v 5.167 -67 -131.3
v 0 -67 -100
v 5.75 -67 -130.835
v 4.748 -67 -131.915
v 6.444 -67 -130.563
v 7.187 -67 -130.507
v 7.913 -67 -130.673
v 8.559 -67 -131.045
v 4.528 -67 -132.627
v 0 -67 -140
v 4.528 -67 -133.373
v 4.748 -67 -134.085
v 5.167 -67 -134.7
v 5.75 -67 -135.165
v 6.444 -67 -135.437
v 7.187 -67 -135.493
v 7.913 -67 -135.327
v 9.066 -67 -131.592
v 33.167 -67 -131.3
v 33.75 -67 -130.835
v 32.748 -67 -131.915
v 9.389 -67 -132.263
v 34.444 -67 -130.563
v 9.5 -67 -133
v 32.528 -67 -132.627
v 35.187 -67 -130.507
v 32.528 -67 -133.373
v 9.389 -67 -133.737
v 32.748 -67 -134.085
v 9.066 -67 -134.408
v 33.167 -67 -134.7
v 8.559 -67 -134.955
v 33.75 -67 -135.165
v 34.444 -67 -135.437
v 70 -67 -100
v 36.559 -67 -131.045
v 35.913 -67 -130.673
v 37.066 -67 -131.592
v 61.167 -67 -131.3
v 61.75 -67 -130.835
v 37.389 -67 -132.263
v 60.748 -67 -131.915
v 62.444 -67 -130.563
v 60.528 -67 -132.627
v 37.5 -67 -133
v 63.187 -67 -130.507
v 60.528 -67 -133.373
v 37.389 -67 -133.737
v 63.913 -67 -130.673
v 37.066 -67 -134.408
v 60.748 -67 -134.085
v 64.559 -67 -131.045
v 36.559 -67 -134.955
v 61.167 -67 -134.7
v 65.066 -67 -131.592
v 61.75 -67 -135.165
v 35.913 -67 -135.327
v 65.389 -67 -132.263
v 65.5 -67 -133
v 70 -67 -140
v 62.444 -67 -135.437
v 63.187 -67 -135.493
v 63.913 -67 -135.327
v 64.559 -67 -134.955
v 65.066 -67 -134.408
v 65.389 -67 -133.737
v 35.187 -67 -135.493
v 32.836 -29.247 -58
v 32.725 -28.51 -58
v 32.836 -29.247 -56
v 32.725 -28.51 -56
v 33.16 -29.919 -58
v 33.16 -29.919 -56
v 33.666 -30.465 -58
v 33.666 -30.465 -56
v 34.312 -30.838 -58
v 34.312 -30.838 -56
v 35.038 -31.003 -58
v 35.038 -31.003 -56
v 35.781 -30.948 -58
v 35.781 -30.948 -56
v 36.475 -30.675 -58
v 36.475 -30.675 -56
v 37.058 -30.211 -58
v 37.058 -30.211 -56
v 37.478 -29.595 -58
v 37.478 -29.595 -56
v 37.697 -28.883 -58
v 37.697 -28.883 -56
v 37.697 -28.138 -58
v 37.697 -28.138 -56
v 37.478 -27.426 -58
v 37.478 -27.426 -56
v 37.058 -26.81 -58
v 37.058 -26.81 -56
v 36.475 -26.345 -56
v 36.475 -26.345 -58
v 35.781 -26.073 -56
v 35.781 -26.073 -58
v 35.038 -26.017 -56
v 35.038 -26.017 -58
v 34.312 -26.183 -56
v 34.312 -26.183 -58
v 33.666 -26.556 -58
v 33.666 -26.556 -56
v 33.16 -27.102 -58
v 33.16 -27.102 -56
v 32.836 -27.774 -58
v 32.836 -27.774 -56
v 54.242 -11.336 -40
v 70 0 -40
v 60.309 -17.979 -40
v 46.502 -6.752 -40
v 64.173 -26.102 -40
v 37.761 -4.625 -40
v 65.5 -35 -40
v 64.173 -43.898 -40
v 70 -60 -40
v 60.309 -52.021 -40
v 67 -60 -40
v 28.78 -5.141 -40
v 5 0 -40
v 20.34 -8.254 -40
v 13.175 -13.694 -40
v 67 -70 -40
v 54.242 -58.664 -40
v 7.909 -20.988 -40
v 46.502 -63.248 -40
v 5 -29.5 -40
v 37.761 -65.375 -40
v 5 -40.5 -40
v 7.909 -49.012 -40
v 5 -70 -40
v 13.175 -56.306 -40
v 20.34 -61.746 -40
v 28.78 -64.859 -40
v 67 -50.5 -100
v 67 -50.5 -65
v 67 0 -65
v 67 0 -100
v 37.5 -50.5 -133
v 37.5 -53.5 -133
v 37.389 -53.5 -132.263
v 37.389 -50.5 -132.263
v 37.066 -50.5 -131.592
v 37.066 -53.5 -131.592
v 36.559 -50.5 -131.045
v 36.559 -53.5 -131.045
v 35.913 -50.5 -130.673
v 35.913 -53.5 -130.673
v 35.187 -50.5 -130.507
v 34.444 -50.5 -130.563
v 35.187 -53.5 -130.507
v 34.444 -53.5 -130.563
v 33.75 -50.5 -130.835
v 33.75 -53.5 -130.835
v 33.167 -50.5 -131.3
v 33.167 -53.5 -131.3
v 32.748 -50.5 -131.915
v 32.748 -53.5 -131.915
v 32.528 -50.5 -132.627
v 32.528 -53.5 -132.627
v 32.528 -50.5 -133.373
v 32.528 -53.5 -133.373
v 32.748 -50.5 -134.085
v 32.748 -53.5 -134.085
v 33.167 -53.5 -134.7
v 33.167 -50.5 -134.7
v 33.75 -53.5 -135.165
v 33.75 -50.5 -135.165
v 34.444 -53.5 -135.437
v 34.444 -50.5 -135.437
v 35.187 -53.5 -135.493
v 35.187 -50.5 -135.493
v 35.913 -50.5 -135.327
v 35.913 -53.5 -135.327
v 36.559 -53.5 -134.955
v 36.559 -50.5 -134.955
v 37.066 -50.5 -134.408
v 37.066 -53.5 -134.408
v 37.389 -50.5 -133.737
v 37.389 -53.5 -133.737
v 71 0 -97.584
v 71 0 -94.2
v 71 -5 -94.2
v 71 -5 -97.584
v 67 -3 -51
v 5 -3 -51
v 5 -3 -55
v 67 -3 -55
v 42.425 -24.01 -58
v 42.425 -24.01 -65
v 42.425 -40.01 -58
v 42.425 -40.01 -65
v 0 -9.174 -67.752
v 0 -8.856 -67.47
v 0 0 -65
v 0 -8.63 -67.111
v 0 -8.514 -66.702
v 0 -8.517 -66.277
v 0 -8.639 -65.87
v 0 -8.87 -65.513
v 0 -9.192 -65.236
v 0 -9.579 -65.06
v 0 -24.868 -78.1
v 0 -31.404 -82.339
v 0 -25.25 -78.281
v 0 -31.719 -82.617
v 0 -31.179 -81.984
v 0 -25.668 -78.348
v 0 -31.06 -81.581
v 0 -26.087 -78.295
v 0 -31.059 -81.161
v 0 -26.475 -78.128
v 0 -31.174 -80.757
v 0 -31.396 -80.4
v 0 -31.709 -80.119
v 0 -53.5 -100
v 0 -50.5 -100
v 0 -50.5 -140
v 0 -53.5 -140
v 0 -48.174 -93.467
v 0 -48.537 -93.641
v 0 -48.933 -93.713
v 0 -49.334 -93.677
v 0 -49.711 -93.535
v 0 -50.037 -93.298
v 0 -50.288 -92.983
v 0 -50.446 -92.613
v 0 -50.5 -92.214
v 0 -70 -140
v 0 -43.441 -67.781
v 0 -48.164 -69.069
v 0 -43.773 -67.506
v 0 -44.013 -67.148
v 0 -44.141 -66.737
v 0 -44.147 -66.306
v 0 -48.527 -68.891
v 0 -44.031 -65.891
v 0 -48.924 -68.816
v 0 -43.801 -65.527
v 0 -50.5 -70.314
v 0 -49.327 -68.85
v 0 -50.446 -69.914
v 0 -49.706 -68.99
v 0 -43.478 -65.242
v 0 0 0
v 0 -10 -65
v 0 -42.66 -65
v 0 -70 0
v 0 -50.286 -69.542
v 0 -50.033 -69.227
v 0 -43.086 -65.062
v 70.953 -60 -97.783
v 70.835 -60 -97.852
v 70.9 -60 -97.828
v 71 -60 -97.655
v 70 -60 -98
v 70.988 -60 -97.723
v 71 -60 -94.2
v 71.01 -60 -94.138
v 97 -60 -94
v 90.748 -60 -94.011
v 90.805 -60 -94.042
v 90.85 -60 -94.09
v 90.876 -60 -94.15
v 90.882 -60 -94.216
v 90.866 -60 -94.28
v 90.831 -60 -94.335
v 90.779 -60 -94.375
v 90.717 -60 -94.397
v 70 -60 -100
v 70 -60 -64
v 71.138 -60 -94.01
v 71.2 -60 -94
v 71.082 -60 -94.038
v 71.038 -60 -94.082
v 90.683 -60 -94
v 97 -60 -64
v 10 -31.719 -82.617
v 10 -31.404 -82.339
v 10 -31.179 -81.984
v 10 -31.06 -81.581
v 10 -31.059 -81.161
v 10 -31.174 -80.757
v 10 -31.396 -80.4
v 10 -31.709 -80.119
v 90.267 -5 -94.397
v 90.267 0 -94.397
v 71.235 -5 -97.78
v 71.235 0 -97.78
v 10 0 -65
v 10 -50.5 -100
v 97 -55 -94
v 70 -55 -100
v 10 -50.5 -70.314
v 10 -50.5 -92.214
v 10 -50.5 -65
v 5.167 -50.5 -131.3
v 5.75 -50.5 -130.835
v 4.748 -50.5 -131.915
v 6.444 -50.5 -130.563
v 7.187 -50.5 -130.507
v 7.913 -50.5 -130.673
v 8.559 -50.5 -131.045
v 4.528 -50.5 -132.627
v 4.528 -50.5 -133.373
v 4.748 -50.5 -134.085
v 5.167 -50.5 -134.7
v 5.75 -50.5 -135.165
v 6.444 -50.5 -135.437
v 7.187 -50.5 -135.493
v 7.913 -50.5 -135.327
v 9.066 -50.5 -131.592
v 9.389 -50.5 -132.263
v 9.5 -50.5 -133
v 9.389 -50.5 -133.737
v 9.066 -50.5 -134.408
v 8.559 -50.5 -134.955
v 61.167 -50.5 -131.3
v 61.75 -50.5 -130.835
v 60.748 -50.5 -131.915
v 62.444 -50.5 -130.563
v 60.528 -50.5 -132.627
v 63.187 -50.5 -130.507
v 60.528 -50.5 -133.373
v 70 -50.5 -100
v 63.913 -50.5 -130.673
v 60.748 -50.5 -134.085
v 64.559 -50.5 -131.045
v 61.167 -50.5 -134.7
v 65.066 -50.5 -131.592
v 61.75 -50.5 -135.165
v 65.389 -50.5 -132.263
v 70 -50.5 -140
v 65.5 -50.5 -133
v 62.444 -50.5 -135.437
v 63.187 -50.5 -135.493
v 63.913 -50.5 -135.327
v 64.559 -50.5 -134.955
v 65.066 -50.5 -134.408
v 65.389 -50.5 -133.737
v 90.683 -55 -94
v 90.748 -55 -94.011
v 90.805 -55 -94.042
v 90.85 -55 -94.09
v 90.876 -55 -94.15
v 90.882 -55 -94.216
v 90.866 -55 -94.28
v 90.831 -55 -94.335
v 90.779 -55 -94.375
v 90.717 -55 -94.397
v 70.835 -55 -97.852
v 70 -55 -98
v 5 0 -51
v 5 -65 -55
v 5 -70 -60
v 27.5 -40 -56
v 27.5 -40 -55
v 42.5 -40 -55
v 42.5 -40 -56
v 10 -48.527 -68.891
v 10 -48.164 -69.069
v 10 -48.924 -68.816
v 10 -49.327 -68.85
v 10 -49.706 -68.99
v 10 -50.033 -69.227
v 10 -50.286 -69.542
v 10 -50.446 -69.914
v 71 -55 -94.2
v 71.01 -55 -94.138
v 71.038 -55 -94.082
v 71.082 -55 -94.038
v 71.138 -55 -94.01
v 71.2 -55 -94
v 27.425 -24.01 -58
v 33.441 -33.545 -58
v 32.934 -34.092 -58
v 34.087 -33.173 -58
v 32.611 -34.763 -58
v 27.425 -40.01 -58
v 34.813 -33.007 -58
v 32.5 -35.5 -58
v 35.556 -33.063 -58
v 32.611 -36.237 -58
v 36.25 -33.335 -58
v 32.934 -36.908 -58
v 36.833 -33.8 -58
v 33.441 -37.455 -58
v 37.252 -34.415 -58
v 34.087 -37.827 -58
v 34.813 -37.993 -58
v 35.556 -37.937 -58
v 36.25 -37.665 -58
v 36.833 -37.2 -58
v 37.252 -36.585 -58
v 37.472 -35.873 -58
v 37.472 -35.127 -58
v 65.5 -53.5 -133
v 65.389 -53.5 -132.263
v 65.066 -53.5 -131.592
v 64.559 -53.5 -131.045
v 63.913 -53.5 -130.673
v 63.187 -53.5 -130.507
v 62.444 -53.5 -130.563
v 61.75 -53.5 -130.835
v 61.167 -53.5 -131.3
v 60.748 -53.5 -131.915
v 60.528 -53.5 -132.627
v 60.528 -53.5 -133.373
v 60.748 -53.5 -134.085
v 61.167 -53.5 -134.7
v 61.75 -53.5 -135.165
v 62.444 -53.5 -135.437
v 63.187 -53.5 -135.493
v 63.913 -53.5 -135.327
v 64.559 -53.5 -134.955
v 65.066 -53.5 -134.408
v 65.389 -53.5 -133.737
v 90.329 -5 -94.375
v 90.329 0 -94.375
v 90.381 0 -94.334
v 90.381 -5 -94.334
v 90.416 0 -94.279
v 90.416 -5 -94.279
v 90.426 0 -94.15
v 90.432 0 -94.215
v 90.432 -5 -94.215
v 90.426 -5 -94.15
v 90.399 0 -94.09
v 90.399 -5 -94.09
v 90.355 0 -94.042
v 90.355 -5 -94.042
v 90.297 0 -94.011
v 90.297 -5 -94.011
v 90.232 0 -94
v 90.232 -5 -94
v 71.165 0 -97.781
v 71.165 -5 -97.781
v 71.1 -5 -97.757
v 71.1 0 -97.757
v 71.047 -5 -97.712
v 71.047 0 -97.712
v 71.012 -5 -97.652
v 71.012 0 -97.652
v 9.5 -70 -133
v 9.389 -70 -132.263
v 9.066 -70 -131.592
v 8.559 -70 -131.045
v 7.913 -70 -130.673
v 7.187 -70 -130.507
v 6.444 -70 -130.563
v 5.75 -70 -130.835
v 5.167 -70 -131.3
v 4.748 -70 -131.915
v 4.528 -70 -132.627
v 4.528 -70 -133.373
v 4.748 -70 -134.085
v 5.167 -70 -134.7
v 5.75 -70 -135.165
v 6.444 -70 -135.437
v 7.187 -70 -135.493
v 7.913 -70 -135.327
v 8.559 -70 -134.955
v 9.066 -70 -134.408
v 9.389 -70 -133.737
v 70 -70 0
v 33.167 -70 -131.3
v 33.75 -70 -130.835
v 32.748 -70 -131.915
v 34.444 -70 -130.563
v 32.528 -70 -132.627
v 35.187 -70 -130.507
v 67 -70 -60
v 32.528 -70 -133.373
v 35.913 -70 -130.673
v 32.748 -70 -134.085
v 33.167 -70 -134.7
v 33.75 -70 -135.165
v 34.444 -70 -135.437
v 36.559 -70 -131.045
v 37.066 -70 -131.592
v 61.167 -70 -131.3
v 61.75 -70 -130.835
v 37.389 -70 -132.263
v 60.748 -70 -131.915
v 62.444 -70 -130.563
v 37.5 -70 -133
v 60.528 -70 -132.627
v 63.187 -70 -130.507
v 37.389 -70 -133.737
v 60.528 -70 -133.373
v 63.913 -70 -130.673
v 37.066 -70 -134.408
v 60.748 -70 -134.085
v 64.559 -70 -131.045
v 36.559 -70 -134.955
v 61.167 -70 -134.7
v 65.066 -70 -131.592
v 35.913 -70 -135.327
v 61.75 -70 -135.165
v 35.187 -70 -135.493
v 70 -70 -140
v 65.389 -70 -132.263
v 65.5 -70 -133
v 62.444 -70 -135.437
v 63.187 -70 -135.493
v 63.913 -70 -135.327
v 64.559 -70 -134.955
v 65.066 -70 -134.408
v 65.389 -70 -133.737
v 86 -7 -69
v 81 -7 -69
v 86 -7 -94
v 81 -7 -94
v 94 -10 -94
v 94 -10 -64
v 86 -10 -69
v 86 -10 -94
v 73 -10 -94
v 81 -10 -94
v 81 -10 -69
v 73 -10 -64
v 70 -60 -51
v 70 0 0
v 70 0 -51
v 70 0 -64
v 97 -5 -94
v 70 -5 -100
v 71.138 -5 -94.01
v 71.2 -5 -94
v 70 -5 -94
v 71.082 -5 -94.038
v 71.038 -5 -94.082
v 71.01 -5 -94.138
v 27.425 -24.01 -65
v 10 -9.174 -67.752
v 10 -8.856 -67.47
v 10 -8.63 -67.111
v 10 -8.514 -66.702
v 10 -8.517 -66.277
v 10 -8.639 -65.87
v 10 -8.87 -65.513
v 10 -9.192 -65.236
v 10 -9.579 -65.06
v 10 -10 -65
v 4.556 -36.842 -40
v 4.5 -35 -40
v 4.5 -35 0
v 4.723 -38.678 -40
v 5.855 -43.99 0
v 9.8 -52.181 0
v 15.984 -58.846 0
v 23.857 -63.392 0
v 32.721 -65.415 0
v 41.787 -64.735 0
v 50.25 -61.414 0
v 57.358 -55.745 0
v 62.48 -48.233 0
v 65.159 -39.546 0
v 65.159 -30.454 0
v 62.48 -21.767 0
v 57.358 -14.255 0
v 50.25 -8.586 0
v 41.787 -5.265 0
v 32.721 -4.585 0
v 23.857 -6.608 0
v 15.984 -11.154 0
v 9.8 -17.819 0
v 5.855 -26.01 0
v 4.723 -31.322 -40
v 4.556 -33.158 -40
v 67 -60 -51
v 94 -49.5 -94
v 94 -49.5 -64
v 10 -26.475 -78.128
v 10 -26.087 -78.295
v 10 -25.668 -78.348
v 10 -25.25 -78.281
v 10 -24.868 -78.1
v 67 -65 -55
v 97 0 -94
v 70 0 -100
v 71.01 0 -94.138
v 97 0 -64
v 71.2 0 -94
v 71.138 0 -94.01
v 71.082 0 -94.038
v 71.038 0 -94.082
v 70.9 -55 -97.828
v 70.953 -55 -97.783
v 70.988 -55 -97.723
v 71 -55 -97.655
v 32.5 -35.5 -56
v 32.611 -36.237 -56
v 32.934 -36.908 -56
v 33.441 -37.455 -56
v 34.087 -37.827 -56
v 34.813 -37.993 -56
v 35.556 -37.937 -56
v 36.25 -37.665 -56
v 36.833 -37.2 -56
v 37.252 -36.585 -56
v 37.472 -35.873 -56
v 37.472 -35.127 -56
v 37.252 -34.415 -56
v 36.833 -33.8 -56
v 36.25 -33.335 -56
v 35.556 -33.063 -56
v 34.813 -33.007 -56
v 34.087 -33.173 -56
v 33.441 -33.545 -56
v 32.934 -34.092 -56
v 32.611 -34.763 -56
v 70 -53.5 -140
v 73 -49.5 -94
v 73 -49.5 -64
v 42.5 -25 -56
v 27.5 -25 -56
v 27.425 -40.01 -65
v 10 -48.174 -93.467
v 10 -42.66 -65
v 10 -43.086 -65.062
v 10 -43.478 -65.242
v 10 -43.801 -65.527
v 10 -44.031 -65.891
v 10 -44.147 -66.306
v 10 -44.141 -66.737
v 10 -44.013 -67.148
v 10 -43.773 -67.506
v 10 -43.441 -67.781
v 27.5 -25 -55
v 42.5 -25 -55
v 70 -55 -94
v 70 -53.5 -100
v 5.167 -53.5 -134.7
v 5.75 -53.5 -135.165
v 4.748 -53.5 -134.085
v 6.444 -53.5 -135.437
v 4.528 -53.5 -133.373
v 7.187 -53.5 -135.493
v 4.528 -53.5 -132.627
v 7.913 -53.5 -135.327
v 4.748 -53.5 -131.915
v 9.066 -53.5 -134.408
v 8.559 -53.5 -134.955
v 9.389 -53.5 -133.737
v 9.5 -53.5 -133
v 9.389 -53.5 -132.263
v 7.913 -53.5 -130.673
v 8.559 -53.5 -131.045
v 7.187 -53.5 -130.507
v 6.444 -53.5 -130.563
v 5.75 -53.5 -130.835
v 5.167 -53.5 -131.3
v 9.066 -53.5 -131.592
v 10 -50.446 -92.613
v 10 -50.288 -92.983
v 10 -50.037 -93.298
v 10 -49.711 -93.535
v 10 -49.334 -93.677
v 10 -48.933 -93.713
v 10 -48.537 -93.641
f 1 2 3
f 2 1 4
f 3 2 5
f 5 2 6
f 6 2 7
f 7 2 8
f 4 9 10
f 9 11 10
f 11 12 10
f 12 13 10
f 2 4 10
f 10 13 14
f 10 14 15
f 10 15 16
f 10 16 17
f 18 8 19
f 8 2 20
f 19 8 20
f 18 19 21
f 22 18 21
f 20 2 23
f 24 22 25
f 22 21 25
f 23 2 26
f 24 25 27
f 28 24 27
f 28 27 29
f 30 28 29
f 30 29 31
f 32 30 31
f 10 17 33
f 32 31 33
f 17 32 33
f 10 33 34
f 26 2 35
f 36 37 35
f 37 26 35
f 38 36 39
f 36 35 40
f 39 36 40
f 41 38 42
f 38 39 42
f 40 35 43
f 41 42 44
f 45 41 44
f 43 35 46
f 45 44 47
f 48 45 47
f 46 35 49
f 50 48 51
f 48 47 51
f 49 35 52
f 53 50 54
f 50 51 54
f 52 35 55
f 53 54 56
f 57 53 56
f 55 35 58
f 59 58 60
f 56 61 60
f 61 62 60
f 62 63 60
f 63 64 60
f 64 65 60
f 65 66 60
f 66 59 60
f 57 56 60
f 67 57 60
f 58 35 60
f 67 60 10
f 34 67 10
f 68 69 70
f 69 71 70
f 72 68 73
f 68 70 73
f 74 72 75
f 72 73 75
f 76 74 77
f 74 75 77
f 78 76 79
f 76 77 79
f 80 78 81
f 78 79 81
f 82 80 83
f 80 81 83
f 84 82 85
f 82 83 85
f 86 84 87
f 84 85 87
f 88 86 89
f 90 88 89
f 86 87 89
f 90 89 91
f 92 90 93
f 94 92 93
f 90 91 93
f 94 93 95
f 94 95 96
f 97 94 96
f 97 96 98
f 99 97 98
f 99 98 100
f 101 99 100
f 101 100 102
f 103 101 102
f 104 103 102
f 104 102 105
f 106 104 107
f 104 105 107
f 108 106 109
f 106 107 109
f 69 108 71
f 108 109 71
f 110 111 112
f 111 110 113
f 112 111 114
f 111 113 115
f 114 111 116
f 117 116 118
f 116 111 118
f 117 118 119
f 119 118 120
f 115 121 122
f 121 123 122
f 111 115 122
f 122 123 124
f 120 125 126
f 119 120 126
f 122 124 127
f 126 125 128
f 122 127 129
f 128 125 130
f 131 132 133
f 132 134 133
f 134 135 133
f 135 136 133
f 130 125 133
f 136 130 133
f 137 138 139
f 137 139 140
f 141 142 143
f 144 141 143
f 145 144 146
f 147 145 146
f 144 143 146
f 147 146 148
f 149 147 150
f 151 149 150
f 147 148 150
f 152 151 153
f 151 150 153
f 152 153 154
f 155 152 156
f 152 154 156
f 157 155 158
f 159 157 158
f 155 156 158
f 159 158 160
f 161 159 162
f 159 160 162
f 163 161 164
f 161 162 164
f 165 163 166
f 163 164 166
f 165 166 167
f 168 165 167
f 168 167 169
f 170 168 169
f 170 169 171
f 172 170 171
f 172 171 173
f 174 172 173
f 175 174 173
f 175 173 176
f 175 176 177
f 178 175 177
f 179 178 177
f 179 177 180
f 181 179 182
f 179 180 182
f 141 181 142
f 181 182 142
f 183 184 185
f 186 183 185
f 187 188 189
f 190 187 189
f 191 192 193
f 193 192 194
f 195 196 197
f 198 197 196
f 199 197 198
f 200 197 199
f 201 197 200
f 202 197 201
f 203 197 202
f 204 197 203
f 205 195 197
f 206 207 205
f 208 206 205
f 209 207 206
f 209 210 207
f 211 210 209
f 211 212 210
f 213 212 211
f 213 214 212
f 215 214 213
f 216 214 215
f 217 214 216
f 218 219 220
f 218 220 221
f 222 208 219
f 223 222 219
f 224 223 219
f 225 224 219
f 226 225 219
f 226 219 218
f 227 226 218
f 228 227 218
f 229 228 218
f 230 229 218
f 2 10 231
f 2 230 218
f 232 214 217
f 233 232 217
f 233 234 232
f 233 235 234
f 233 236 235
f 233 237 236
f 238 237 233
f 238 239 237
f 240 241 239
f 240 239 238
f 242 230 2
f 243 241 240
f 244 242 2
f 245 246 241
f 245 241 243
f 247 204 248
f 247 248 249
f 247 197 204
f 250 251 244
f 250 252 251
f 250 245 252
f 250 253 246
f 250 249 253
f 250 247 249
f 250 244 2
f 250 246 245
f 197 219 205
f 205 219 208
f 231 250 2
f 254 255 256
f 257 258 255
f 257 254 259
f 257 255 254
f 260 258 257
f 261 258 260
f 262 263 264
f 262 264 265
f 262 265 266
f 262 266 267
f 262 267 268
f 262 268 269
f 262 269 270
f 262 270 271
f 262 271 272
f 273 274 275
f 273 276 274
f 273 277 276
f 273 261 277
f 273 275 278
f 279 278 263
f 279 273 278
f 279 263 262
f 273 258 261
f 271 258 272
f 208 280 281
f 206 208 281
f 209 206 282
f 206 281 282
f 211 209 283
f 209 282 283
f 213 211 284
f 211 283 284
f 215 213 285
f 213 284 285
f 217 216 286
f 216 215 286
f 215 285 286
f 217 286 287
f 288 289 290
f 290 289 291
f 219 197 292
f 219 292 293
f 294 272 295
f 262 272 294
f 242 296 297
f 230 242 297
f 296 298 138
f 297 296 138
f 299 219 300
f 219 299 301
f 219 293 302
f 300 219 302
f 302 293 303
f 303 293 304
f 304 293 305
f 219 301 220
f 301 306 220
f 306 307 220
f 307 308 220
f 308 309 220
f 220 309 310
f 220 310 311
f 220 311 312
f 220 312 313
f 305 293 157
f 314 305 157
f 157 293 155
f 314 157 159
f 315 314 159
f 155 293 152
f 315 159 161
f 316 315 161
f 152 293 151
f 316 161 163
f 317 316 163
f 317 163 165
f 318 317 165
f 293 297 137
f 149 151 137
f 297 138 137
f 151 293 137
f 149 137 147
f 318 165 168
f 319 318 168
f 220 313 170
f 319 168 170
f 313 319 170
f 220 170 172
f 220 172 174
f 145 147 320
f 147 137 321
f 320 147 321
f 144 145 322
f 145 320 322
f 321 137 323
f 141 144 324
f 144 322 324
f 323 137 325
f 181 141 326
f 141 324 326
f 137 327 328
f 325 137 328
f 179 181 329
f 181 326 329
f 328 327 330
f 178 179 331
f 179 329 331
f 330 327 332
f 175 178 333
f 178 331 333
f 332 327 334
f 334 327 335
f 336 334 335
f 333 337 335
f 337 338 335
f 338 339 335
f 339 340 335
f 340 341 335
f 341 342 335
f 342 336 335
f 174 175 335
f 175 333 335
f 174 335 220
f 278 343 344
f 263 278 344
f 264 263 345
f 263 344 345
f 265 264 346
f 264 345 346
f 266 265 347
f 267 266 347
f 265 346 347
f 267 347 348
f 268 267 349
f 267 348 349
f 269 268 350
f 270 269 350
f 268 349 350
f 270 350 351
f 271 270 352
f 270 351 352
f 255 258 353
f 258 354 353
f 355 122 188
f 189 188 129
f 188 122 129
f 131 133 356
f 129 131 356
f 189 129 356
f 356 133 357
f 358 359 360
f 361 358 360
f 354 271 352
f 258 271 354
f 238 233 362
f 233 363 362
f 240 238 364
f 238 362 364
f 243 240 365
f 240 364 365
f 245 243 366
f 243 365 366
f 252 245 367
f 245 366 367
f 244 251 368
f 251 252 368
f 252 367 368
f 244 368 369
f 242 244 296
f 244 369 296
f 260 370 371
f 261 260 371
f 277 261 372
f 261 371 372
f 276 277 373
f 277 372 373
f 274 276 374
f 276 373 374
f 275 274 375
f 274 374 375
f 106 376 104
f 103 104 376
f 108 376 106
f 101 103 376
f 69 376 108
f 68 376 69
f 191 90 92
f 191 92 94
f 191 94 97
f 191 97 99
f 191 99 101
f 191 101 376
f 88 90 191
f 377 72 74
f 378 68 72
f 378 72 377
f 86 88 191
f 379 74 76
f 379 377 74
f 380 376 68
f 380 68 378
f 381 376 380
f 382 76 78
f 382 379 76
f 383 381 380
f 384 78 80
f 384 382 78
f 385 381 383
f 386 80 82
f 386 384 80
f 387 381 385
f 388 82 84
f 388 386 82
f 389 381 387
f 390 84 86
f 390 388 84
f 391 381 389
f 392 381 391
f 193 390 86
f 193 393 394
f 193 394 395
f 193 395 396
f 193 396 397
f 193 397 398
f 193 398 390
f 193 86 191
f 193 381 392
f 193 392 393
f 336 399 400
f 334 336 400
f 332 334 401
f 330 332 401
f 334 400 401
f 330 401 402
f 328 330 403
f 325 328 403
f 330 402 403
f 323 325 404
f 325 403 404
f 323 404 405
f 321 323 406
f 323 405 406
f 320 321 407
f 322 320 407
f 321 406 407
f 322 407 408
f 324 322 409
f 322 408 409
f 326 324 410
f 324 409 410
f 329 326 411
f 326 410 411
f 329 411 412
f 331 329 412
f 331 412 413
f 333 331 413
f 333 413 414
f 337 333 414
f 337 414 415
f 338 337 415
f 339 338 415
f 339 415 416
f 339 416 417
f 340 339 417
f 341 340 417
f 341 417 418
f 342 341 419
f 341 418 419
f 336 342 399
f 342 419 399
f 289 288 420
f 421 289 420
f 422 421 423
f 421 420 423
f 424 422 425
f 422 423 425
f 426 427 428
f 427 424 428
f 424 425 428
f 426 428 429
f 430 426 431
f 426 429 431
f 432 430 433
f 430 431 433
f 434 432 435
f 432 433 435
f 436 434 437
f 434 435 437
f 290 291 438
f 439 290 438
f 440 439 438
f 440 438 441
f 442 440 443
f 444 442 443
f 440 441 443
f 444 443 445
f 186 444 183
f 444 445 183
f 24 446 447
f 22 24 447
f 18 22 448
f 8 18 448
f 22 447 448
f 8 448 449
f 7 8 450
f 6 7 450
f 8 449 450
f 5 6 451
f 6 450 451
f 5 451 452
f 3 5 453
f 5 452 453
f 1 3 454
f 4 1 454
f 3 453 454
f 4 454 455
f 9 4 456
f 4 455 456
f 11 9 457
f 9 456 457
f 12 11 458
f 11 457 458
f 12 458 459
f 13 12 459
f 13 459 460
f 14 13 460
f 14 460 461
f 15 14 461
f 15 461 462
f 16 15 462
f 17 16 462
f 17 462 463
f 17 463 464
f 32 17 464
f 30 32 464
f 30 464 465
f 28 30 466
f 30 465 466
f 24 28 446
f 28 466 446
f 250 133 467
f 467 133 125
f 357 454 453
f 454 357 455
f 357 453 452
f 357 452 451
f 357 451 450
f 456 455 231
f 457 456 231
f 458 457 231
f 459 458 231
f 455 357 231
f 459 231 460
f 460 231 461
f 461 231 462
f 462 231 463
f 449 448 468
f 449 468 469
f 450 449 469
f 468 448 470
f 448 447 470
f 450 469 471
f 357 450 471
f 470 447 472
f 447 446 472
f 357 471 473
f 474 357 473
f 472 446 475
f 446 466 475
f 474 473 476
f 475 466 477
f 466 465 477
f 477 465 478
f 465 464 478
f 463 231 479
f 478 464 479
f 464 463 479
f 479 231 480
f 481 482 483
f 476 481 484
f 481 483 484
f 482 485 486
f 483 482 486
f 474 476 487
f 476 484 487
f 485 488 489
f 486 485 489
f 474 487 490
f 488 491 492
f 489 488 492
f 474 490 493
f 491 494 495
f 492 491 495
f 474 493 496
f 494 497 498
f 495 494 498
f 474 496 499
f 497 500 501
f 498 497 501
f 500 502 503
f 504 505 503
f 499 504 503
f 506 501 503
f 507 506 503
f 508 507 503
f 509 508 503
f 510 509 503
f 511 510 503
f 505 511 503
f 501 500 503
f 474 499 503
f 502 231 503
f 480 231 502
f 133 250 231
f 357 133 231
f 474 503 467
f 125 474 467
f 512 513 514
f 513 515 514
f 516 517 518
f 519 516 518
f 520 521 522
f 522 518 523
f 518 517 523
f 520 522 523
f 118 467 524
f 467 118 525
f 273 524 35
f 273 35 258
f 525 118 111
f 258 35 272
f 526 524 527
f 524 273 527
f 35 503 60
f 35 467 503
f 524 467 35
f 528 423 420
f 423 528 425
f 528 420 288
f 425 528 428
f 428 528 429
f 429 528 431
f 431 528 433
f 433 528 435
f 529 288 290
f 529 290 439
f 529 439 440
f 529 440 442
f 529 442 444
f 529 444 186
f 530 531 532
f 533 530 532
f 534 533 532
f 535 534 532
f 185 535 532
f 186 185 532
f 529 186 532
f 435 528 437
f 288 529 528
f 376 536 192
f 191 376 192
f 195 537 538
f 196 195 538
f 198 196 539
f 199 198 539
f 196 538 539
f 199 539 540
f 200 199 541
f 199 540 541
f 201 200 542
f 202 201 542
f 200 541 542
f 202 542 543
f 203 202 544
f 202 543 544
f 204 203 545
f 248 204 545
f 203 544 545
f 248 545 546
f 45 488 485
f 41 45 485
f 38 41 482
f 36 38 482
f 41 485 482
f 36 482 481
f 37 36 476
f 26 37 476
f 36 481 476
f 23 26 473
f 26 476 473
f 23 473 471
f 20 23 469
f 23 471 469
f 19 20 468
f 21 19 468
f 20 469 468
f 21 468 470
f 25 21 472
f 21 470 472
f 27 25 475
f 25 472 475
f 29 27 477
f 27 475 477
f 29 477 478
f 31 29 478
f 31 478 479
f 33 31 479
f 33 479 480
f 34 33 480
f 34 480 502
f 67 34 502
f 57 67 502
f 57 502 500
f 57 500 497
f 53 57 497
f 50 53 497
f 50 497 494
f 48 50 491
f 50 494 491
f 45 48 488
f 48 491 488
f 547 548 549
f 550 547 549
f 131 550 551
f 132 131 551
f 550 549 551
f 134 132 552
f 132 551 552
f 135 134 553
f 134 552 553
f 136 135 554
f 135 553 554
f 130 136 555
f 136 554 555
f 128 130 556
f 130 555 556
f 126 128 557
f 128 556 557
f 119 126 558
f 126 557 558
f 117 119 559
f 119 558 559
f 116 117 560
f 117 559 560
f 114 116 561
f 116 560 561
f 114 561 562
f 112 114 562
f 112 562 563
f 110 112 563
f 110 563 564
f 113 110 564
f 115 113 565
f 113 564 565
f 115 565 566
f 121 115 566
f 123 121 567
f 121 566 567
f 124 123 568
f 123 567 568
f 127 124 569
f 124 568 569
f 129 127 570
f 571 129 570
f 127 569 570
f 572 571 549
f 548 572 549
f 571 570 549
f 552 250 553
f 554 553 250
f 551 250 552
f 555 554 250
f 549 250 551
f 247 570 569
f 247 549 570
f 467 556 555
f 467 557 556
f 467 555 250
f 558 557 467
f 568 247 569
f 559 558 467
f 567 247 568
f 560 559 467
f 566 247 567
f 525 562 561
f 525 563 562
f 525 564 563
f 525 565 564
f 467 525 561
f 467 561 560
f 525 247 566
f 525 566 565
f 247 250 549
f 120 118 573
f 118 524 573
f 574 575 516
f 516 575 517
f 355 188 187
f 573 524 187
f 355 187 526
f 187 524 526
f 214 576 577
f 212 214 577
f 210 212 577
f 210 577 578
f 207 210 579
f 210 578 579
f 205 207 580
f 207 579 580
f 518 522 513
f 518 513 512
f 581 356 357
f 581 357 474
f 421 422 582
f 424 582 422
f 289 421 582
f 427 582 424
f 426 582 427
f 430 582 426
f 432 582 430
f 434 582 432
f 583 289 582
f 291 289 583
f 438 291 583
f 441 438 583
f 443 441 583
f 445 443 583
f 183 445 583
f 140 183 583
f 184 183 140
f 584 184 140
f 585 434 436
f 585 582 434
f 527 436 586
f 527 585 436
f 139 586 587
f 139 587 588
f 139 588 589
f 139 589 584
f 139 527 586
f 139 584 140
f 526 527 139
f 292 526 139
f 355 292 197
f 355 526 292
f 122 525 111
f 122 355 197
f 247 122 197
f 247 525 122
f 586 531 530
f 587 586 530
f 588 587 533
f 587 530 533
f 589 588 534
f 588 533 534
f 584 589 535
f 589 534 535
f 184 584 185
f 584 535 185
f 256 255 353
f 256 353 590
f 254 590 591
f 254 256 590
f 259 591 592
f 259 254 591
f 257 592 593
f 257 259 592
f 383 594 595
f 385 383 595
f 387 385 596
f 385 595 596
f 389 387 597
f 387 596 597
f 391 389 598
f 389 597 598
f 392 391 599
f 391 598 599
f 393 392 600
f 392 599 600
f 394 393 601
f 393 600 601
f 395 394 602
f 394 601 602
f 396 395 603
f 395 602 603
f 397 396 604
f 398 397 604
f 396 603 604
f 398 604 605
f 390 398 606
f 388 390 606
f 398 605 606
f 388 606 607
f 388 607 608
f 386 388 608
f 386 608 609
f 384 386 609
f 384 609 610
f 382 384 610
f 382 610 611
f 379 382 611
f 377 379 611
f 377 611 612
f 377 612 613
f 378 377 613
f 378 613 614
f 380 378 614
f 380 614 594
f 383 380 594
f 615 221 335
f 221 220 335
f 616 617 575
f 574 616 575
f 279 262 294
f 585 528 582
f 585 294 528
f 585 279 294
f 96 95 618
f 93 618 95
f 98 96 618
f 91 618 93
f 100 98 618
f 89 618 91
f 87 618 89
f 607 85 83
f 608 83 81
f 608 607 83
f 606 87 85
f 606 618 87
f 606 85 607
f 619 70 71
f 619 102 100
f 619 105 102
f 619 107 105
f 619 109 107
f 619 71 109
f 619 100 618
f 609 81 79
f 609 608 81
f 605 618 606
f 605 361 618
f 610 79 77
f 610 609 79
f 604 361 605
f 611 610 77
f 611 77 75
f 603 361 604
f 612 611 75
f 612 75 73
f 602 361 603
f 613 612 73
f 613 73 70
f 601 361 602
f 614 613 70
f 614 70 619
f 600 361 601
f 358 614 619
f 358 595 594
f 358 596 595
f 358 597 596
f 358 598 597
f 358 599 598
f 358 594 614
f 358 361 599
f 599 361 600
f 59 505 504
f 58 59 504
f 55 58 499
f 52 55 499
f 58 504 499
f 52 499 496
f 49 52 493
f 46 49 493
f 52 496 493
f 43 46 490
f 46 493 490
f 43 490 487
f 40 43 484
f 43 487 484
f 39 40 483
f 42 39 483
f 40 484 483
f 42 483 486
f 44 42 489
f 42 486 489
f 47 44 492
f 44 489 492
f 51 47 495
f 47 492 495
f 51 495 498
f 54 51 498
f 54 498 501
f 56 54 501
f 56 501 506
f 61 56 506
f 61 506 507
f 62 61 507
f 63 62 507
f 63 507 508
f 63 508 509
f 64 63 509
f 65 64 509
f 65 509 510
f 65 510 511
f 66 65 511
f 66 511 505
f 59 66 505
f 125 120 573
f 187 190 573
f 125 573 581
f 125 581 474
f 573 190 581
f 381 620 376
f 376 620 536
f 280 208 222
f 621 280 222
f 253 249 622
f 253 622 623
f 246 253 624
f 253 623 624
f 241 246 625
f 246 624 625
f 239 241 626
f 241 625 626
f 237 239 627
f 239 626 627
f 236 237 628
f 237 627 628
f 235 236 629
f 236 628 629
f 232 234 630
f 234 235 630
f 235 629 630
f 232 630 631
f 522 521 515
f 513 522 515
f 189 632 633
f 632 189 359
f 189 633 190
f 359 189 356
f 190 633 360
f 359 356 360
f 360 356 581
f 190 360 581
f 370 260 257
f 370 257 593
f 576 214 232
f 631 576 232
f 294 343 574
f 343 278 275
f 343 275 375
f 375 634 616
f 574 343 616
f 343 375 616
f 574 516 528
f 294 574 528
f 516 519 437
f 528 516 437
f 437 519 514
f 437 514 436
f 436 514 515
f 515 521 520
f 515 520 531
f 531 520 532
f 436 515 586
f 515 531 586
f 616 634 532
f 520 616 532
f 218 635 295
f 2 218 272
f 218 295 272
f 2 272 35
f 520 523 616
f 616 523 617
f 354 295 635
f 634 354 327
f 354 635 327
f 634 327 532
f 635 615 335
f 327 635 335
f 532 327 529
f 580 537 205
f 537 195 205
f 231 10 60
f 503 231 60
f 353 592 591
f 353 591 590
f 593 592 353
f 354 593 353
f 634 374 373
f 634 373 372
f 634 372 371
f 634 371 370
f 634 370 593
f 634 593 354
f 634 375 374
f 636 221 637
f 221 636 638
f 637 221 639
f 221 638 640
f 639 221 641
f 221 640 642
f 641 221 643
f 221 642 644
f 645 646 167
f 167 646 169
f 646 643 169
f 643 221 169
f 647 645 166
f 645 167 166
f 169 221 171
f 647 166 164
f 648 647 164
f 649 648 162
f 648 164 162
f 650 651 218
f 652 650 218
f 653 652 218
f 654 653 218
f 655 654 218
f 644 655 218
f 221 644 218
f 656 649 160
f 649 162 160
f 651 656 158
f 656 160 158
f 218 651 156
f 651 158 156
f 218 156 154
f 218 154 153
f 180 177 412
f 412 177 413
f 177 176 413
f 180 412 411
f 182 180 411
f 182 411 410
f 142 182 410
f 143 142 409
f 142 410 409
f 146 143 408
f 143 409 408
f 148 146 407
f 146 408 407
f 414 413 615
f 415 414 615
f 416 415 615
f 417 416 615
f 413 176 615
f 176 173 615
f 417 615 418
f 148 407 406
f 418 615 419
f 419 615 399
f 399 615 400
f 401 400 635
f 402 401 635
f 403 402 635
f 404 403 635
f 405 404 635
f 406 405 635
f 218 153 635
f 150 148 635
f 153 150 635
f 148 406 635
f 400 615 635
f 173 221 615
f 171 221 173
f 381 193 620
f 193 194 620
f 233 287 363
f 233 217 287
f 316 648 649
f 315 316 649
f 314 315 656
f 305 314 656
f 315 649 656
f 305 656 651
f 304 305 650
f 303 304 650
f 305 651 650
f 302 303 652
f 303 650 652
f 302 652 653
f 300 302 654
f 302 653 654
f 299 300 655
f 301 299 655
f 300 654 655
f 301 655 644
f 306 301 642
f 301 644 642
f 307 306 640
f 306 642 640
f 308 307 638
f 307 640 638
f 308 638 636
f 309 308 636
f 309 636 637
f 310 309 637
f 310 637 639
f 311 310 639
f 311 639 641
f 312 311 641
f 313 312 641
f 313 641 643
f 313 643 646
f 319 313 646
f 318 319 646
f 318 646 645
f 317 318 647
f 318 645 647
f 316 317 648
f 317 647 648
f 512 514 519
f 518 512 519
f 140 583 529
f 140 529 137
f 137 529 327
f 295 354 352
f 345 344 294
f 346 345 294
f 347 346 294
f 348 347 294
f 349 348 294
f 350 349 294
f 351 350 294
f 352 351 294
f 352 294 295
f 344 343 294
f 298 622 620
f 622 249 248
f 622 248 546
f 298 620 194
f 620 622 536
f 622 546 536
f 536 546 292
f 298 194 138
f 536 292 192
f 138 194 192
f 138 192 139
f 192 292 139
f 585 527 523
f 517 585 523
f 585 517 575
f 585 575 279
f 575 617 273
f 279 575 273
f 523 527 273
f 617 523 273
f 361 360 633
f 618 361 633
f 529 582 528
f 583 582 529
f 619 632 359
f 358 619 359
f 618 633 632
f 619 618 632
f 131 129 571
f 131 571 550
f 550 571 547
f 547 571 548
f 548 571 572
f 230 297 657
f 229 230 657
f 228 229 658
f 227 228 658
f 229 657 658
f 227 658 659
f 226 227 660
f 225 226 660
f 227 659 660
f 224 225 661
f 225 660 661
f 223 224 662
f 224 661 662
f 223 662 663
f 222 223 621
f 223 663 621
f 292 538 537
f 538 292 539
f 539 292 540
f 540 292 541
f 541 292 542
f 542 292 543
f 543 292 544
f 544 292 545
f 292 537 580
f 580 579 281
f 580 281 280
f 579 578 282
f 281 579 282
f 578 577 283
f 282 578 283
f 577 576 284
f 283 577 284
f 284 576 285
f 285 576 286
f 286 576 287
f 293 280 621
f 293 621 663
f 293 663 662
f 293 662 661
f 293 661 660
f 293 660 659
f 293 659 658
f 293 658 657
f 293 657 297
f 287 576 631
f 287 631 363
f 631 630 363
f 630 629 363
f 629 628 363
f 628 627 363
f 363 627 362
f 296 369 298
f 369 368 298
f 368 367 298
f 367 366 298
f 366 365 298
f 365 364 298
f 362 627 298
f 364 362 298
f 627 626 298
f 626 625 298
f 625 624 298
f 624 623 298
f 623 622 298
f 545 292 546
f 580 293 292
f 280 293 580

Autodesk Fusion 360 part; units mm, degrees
sketch "Sketch1" plane through (0, 0, 0) normal (0, 0, 1) x (1, 0, 0)
  line L0 (0, 0) -> (70, 0)
  line L1 (70, 0) -> (70, -70)
  line L2 (70, -70) -> (0, -70)
  line L3 (0, -70) -> (0, 0)
  dimension "d3" = 70
  dimension "d4" = 70
extrude "Extrude1" add sketch "Sketch1" against normal blind 140
sketch "Sketch2" plane through (0, 0, 0) normal (0, 0, 1) x (-1, 0, 0)
  line L0 (0, 70) -> (-70, 70)
  line L1 (-70, 70) -> (-70, 0)
  line L2 (-70, 0) -> (0, 0)
  line L3 (0, 0) -> (0, 70)
  line L4 (0, 0) -> (-35, 0) construction
  line L5 (-35, 0) -> (-35, 35) construction
  circle A0 centre (-35, 35) radius 30.5
  dimension "d7" = 35
  dimension "d8" = 35
  dimension "d9" = 61
extrude "Extrude2" cut sketch "Sketch2" against normal blind 40 contours A0
sketch "Sketch3" plane through (0, -70, 0) normal (0, -1, 0) x (1, 0, 0)
  line L0 (70, 0) -> (0, 0)
  line L1 (0, 0) -> (0, -140)
  line L2 (0, -140) -> (70, -140)
  line L3 (70, -140) -> (70, 0)
  line L4 (0, 0) -> (0, -40) construction
  line L5 (0, -40) -> (5, -40) construction
  line L6 (5, -40) -> (5, -55) construction
  line L7 (5, -55) -> (70, -55)
  line L8 (70, -55) -> (70, -40)
  line L9 (70, -40) -> (5, -40)
  line L10 (5, -40) -> (5, -55)
  dimension "d12" = 40
  dimension "d13" = 5
  dimension "d14" = 15
extrude "Extrude3" cut sketch "Sketch3" against normal blind 120 contours L3 L7 L8 L9 L10
sketch "Sketch4" plane through (70, 0, 0) normal (1, 0, 0) x (0, 1, 0)
  line L0 (0, -55) -> (-70, -55)
  line L1 (-70, -55) -> (-70, -140)
  line L2 (-70, -140) -> (0, -140)
  line L3 (0, -140) -> (0, -55)
  line L4 (-70, -140) -> (-67, -140) construction
  line L5 (-67, -140) -> (-53.5, -140)
  line L6 (-53.5, -140) -> (-53.5, -100)
  line L7 (-53.5, -100) -> (-67, -100)
  line L8 (-67, -100) -> (-67, -140)
  line L9 (-53.5, -140) -> (-50.5, -140) construction
  line L10 (-50.5, -140) -> (0, -140)
  line L11 (0, -140) -> (0, -100)
  line L12 (0, -100) -> (-50.5, -100)
  line L13 (-50.5, -100) -> (-50.5, -140)
  dimension "d19" = 3
  dimension "d20" = 13.5
  dimension "d21" = 40
  dimension "d24" = 3
extrude "Extrude4" cut sketch "Sketch4" against normal blind 170 contours L2 L3 L10 L11 L12 L13 | L2 L5 L6 L7 L8
sketch "Sketch5" plane through (0, 0, 0) normal (0, 1, 0) x (-1, 0, 0)
  line L0 (-70, -100) -> (0, -100)
  line L1 (0, -100) -> (0, 0)
  line L2 (0, 0) -> (-70, 0)
  line L3 (-70, -40) -> (-5, -40)
  line L4 (-5, -40) -> (-5, -55)
  line L5 (-5, -55) -> (-70, -55)
  line L6 (-70, 0) -> (-70, -40)
  line L7 (-70, -100) -> (-67, -100)
  line L8 (-67, -100) -> (0, -100)
  line L9 (0, -100) -> (0, -65)
  line L10 (0, -65) -> (-67, -65)
  line L11 (-67, -65) -> (-67, -100)
  line L12 (-70, -55) -> (-70, -100)
  dimension "d25" = 3
  dimension "d26" = 67
  dimension "d27" = 35
extrude "Extrude5" cut sketch "Sketch5" against normal blind 50.5 contours L0 L1 L8 L9 L10 L11
sketch "Sketch6" plane through (0, 0, 0) normal (-1, 0, 0) x (0, -1, 0)
  line L0 (50.5, -65) -> (50.5, -140)
  line L1 (50.5, -140) -> (53.5, -140)
  line L2 (53.5, -140) -> (53.5, -100)
  line L3 (53.5, -100) -> (67, -100)
  line L4 (67, -100) -> (67, -140)
  line L5 (67, -140) -> (70, -140)
  line L6 (70, -140) -> (70, 0)
  line L7 (70, 0) -> (0, 0)
  line L8 (0, 0) -> (0, -65)
  line L9 (0, -65) -> (50.5, -65)
  line L10 (0, -65) -> (50.5, -100)
  line L11 (50.5, -100) -> (50.5, -95)
  line L12 (0, -65) -> (5, -65)
  line L13 (5, -65) -> (50.5, -95)
extrude "Extrude6" add sketch "Sketch6" against normal blind 10 contours L0 L9 L10 L11 L12 L13
sketch "Sketch8" plane through (0, 0, 0) normal (-1, 0, 0) x (0, -1, 0)
  line L0 (50.5, -100) -> (50.5, -140)
  line L1 (50.5, -140) -> (53.5, -140)
  line L2 (53.5, -140) -> (53.5, -100)
  line L3 (53.5, -100) -> (67, -100)
  line L4 (67, -100) -> (67, -140)
  line L5 (67, -140) -> (70, -140)
  line L6 (70, -140) -> (70, 0)
  line L7 (70, 0) -> (0, 0)
  line L8 (0, 0) -> (0, -65)
  line L9 (0, -65) -> (50.5, -100)
  line L10 (50.5, -95) -> (5, -65)
  line L11 (5, -65) -> (50.5, -65)
  line L12 (50.5, -65) -> (50.5, -95)
  line L13 (27.75, -80) -> (29.8372, -81.3761)
  line L14 (50.5, -65) -> (50.5, -67.5)
  line L15 (29.8372, -81.3761) -> (50.5, -67.5)
  line L16 (27.75, -80) -> (25.6628, -78.6239)
  line L17 (50.5, -65) -> (48, -65)
  line L18 (25.6628, -78.6239) -> (48, -65)
  dimension "d35" = 2.5
  dimension "d36" = 2.5
  dimension "d37" = 2.5
  dimension "d38" = 2.5
extrude "Extrude7" add sketch "Sketch8" against normal blind 10 contours L10 L11 L12 L13 L14 L15 L16 L17 L18
fillet "Fillet2" radius 1.5 6 edges at (5, -25.6628, -78.6239) (5, -50.5, -95) (5, -50.5, -67.5) (5, -29.8372, -81.3761) (5, -5, -65) (5, -48, -65)
sketch "Sketch10" plane through (0, -70, 0) normal (0, -1, 0) x (1, 0, 0)
  line L0 (70, 0) -> (0, 0)
  line L1 (0, 0) -> (0, -140)
  line L2 (0, -140) -> (70, -140)
  line L3 (70, -40) -> (70, 0)
  line L4 (70, -55) -> (5, -55)
  line L5 (5, -55) -> (5, -40)
  line L6 (5, -40) -> (70, -40)
  line L7 (0, -140) -> (0, -133) construction
  line L8 (0, -133) -> (7, -133) construction
  line L9 (70, -40) -> (70, -33) construction
  line L10 (70, -33) -> (63, -33) construction
  circle A0 centre (7, -133) radius 2.5
  circle A1 centre (35, -133) radius 2.5
  circle A2 centre (63, -133) radius 2.5
  line L11 (70, -140) -> (70, -55)
  dimension "d43" = 7
  dimension "d44" = 7
  dimension "d45" = 7
  dimension "d46" = 7
  dimension "d47" = 5
  dimension "d50" = 56
  dimension "d51" = 0
extrude "Extrude8" cut sketch "Sketch10" against normal blind 30 contours A0 | A1 | A2
chamfer "Chamfer1" distance 5 angle 45 1 edges at (37.5, -70, -55)
sketch "Sketch11" plane through (0, 0, -55) normal (0, 0, 1) x (-1, 0, 0)
  line L0 (-5, 65) -> (-70, 65)
  line L1 (-70, 65) -> (-70, 0)
  line L2 (-70, 0) -> (-5, 0)
  line L3 (-5, 0) -> (-5, 65)
  line L4 (-70, 70) -> (-67, 70)
  line L5 (-67, 70) -> (-67, 0)
  line L6 (-67, 0) -> (-70, 0)
  line L7 (-70, 0) -> (-70, 70)
  dimension "d55" = 3
  dimension "d56" = 70
extrude "Extrude9" add sketch "Sketch11" along normal blind 4 contours L0 L1 L2 L5 L6 L7 | L0 L4 L5 L7
extrude "Extrude10" add 1 faces at (69, -68.3333, -55) along direction (0, 0, -1) up to surface end surface through (5, -67.5, -57.5) normal (0, -0.707107, 0.707107) offset 0
sketch "Sketch12" plane through (67, 0, 0) normal (-1, 0, 0) x (0, -1, 0)
  line L0 (70, -60) -> (70, -51)
  line L1 (70, -51) -> (0, -51)
  line L2 (0, -51) -> (0, -55)
  line L3 (0, -55) -> (65, -55)
  line L4 (65, -55) -> (70, -60)
  line L5 (0, -51) -> (3, -51)
  line L6 (3, -51) -> (3, -55)
  line L7 (3, -55) -> (0, -55)
  line L8 (0, -55) -> (0, -51)
  dimension "d61" = 3
  dimension "d62" = 4
extrude "Extrude11" add sketch "Sketch12" along normal up to surface (62 mm away) contours L1 L2 L3 L5 L6 L7 L8
sketch "Sketch13" plane through (0, 0, -51) normal (0, 0, 1) x (-1, 0, 0)
  line L0 (-70, 0) -> (-5, 0)
  line L1 (-5, 0) -> (-5, 3)
  line L2 (-5, 3) -> (-67, 3)
  line L3 (-67, 3) -> (-67, 70)
  line L4 (-67, 70) -> (-70, 70)
  line L5 (-70, 70) -> (-70, 0)
  line L6 (-67, 70) -> (-70, 70)
  line L7 (-70, 70) -> (-70, 60)
  line L8 (-70, 60) -> (-67, 60)
  line L9 (-67, 60) -> (-67, 70)
  dimension "d65" = 3
  dimension "d66" = 10
extrude "Extrude12" add sketch "Sketch13" along normal up to surface (11 mm away) contours L3 L4 L5 L6 L7 L8 L9
sketch "Sketch14" plane through (70, 0, 0) normal (1, 0, 0) x (0, 1, 0)
  line L0 (-70, 0) -> (-70, -140)
  line L1 (-70, -140) -> (-67, -140)
  line L2 (-67, -140) -> (-67, -100)
  line L3 (-67, -100) -> (-53.5, -100)
  line L4 (-53.5, -100) -> (-53.5, -140)
  line L5 (-53.5, -140) -> (-50.5, -140)
  line L6 (-50.5, -140) -> (-50.5, -100)
  line L7 (-50.5, -100) -> (0, -100)
  line L8 (0, -100) -> (0, -51)
  line L9 (0, -51) -> (-60, -51)
  line L10 (-60, -51) -> (-60, -40)
  line L11 (-60, -40) -> (0, -40)
  line L12 (0, -40) -> (0, 0)
  line L13 (0, 0) -> (-70, 0)
  line L14 (0, -51) -> (0, -64) construction
  line L15 (0, -64) -> (-60, -64)
  line L16 (-60, -64) -> (-60, -94)
  line L17 (-60, -94) -> (0, -94)
  line L18 (0, -94) -> (0, -64)
  dimension "d69" = 13
  dimension "d70" = 60
  dimension "d71" = 30
extrude "Extrude13" add sketch "Sketch14" along normal blind 27 contours L8 L15 L16 L17 L18
sketch "Sketch15" plane through (0, 0, -64) normal (0, 0, 1) x (-1, 0, 0)
  line L0 (-70, 0) -> (-70, 60)
  line L1 (-70, 60) -> (-97, 60)
  line L2 (-97, 60) -> (-97, 0)
  line L3 (-97, 0) -> (-70, 0)
  line L4 (-97, 0) -> (-97, 10) construction
  line L5 (-97, 60) -> (-97, 49.5) construction
  line L6 (-70, 60) -> (-70, 49.5) construction
  line L7 (-70, 0) -> (-70, 10) construction
  line L8 (-70, 49.5) -> (-73, 49.5) construction
  line L9 (-97, 10) -> (-94, 10) construction
  line L10 (-73, 49.5) -> (-94, 49.5)
  line L11 (-94, 49.5) -> (-94, 10)
  line L12 (-94, 10) -> (-73, 10)
  line L13 (-73, 10) -> (-73, 49.5)
  dimension "d74" = 10
  dimension "d75" = 10.5
  dimension "d76" = 10.5
  dimension "d77" = 10
  dimension "d78" = 3
  dimension "d79" = 3
extrude "Extrude14" cut sketch "Sketch15" against normal blind 36 contours L10 L11 L12 L13
sketch "Sketch16" plane through (0, 0, 0) normal (0, 1, 0) x (-1, 0, 0)
  line L0 (-67, -65) -> (-10, -65)
  line L1 (-10, -65) -> (0, -65)
  line L2 (0, -65) -> (0, 0)
  line L3 (0, 0) -> (-70, 0)
  line L4 (-70, 0) -> (-70, -40)
  line L5 (-70, -40) -> (-5, -40)
  line L6 (-5, -40) -> (-5, -51)
  line L7 (-5, -51) -> (-70, -51)
  line L8 (-70, -51) -> (-70, -64)
  line L9 (-70, -64) -> (-97, -64)
  line L10 (-97, -64) -> (-97, -94)
  line L11 (-97, -94) -> (-70, -94)
  line L12 (-70, -94) -> (-70, -100)
  line L13 (-70, -100) -> (-67, -100)
  line L14 (-67, -100) -> (-67, -65)
  line L15 (-97, -94) -> (-70, -100)
  line L16 (-70, -100) -> (-70, -98)
  line L17 (-97, -94) -> (-95, -94)
  line L18 (-95, -94) -> (-92.5, -94)
  line L19 (-92.5, -94) -> (-70, -98)
  line L20 (-95.8, -95.2) -> (-95.7872, -95.1423)
  dimension "d82" = 2
  dimension "d83" = 2
extrude "Extrude15" add sketch "Sketch16" against normal blind 5 contours L11 L12 L15 L16 L17 L18 L19
sketch "Sketch17" plane through (0, -60, 0) normal (0, -1, 0) x (1, 0, 0)
  line L0 (70, -64) -> (70, -94)
  line L1 (70, -94) -> (97, -94)
  line L2 (97, -94) -> (97, -64)
  line L3 (97, -64) -> (70, -64)
  line L4 (70, -94) -> (70, -100) construction
  line L5 (70, -100) -> (70, -98)
  line L6 (97, -94) -> (93, -94)
  line L7 (70, -100) -> (97, -94)
  line L8 (93, -94) -> (70, -98)
  dimension "d86" = 2
  dimension "d87" = 4
extrude "Extrude16" add sketch "Sketch17" against normal blind 5 contours L1 L5 L6 L7 L8
sketch "Sketch18" plane through (0, 0, -94) normal (0, 0, -1) x (1, 0, 0)
  line L0 (73, 49.5) -> (94, 49.5)
  line L1 (94, 49.5) -> (94, 10)
  line L2 (94, 10) -> (73, 10)
  line L3 (73, 10) -> (73, 49.5)
  line L4 (97, 55) -> (93, 55)
  line L5 (93, 55) -> (93, 60)
  line L6 (93, 60) -> (70, 60)
  line L7 (70, 60) -> (70, 0)
  line L8 (70, 0) -> (92.5, 0)
  line L9 (92.5, 0) -> (92.5, 5)
  line L10 (92.5, 5) -> (97, 5)
  line L11 (97, 5) -> (97, 55)
  line L12 (73, 10) -> (94, 10) construction
  line L13 (83.5, 10) -> (86, 10)
  line L14 (86, 10) -> (81, 10)
  line L15 (81, 10) -> (81, 7)
  line L16 (81, 7) -> (86, 7)
  line L17 (86, 7) -> (86, 10)
  dimension "d90" = 2.5
  dimension "d91" = 3
extrude "Extrude17" cut sketch "Sketch18" against normal blind 25 contours L2 L13 L14 L15 L16 L17
sketch "Sketch19" plane through (0, 0, -94) normal (0, 0, -1) x (1, 0, 0)
  line L0 (97, 55) -> (93, 55)
  line L1 (93, 55) -> (93, 60)
  line L2 (93, 60) -> (70, 60)
  line L3 (70, 60) -> (70, 0)
  line L4 (70, 0) -> (92.5, 0)
  line L5 (92.5, 0) -> (92.5, 5)
  line L6 (92.5, 5) -> (97, 5)
  line L7 (97, 5) -> (97, 55)
  line L8 (86, 10) -> (86, 7)
  line L9 (86, 7) -> (81, 7)
  line L10 (81, 7) -> (81, 10)
  line L11 (81, 10) -> (73, 10)
  line L12 (73, 10) -> (73, 49.5)
  line L13 (73, 49.5) -> (94, 49.5)
  line L14 (94, 49.5) -> (94, 10)
  line L15 (94, 10) -> (86, 10)
  line L16 (70, 60) -> (71, 60)
  line L17 (71, 60) -> (71, 55)
  line L18 (71, 55) -> (70, 55)
  line L19 (70, 55) -> (70, 60)
  line L20 (70, 0) -> (71, 0)
  line L21 (71, 0) -> (71, 5)
  line L22 (71, 5) -> (70, 5)
  line L23 (70, 5) -> (70, 0)
  dimension "d94" = 1
  dimension "d95" = 5
  dimension "d96" = 1
  dimension "d97" = 5
extrude "Extrude18" add sketch "Sketch19" along normal up to surface contours L2 L3 L16 L17 L18 L19 | L3 L4 L20 L21 L22 L23 end surface through (92.5, 0, -94) normal (-0.175033, 0, 0.984563) offset 0
fillet "Fillet3" radius 0.2 6 edges at (71, -2.5, -94) (71, -2.5, -97.8222) (92.5, -2.5, -94) (71, -57.5, -94) (71, -57.5, -97.8222) (93, -57.5, -94)
sketch "Sketch20" plane through (0, 0, -55) normal (0, 0, 1) x (-1, 0, 0)
  line L0 (-67, 3) -> (-5, 3)
  line L1 (-5, 3) -> (-5, 65)
  line L2 (-5, 65) -> (-67, 65)
  line L3 (-67, 65) -> (-67, 3)
  line L4 (-70, 0) -> (-35, 0) construction
  line L5 (-35, 0) -> (-35, 35) construction
  line L6 (-35, 35) -> (-35, 40) construction
  line L7 (-35, 35) -> (-35, 30) construction
  line L8 (-35, 40) -> (-27.5, 40) construction
  line L9 (-27.5, 40) -> (-42.5, 40)
  line L10 (-42.5, 40) -> (-42.5, 25)
  line L11 (-42.5, 25) -> (-27.5, 25)
  line L12 (-27.5, 25) -> (-27.5, 40)
  dimension "d102" = 35
  dimension "d103" = 35
  dimension "d104" = 5
  dimension "d105" = 5
  dimension "d107" = 7.5
  dimension "d108" = 15
  dimension "d109" = 15
extrude "Extrude19" cut sketch "Sketch20" against normal blind 1 contours L9 L10 L11 L12
sketch "Sketch21" plane through (0, 0, -56) normal (0, 0, 1) x (-1, 0, 0)
  line L0 (-27.5, 25) -> (-27.5, 40)
  line L1 (-27.5, 40) -> (-42.5, 40)
  line L2 (-42.5, 40) -> (-42.5, 25)
  line L3 (-42.5, 25) -> (-27.5, 25)
  line L4 (-42.5, 40) -> (-35, 40) construction
  line L5 (-35, 40) -> (-35, 38) construction
  circle A0 centre (-35, 35.5) radius 2.5
  line L6 (-34.9971, 33) -> (-34.9971, 31) construction
  circle A1 centre (-35.2251, 28.5104) radius 2.5
  dimension "d112" = 2
  dimension "d113" = 5
  dimension "d114" = 2
  dimension "d115" = 5
extrude "Extrude20" cut sketch "Sketch21" against normal blind 14 contours A0 | A1
sketch "Sketch22" plane through (0, 0, -65) normal (0, 0, -1) x (1, 0, 0)
  circle A0 centre (35, 35.5) radius 2.5
  circle A1 centre (35.2251, 28.5104) radius 2.5
  line L0 (10, 42.66) -> (0, 42.66)
  line L1 (0, 42.66) -> (0, 10)
  line L2 (0, 10) -> (10, 10)
  line L3 (10, 10) -> (10, 0)
  line L4 (10, 0) -> (67, 0)
  line L5 (67, 0) -> (67, 50.5)
  line L6 (67, 50.5) -> (10, 50.5)
  line L7 (10, 50.5) -> (10, 42.66)
  line L8 (35.2251, 26.0104) -> (35.2251, 24.0104) construction
  line L9 (34.9884, 38) -> (34.9884, 40) construction
  line L10 (35.2251, 24.0104) -> (27.4251, 24.0104) construction
  line L11 (27.4251, 24.0104) -> (42.4251, 24.0104)
  line L12 (42.4251, 24.0104) -> (42.4251, 40.0104)
  line L13 (42.4251, 40.0104) -> (27.4251, 40.0104)
  line L14 (27.4251, 40.0104) -> (27.4251, 24.0104)
  dimension "d118" = 2
  dimension "d119" = 2
  dimension "d120" = 7.8
  dimension "d121" = 15
  dimension "d122" = 16
extrude "Extrude21" cut sketch "Sketch22" against normal blind 7 contours L11 L12 L13 L14
